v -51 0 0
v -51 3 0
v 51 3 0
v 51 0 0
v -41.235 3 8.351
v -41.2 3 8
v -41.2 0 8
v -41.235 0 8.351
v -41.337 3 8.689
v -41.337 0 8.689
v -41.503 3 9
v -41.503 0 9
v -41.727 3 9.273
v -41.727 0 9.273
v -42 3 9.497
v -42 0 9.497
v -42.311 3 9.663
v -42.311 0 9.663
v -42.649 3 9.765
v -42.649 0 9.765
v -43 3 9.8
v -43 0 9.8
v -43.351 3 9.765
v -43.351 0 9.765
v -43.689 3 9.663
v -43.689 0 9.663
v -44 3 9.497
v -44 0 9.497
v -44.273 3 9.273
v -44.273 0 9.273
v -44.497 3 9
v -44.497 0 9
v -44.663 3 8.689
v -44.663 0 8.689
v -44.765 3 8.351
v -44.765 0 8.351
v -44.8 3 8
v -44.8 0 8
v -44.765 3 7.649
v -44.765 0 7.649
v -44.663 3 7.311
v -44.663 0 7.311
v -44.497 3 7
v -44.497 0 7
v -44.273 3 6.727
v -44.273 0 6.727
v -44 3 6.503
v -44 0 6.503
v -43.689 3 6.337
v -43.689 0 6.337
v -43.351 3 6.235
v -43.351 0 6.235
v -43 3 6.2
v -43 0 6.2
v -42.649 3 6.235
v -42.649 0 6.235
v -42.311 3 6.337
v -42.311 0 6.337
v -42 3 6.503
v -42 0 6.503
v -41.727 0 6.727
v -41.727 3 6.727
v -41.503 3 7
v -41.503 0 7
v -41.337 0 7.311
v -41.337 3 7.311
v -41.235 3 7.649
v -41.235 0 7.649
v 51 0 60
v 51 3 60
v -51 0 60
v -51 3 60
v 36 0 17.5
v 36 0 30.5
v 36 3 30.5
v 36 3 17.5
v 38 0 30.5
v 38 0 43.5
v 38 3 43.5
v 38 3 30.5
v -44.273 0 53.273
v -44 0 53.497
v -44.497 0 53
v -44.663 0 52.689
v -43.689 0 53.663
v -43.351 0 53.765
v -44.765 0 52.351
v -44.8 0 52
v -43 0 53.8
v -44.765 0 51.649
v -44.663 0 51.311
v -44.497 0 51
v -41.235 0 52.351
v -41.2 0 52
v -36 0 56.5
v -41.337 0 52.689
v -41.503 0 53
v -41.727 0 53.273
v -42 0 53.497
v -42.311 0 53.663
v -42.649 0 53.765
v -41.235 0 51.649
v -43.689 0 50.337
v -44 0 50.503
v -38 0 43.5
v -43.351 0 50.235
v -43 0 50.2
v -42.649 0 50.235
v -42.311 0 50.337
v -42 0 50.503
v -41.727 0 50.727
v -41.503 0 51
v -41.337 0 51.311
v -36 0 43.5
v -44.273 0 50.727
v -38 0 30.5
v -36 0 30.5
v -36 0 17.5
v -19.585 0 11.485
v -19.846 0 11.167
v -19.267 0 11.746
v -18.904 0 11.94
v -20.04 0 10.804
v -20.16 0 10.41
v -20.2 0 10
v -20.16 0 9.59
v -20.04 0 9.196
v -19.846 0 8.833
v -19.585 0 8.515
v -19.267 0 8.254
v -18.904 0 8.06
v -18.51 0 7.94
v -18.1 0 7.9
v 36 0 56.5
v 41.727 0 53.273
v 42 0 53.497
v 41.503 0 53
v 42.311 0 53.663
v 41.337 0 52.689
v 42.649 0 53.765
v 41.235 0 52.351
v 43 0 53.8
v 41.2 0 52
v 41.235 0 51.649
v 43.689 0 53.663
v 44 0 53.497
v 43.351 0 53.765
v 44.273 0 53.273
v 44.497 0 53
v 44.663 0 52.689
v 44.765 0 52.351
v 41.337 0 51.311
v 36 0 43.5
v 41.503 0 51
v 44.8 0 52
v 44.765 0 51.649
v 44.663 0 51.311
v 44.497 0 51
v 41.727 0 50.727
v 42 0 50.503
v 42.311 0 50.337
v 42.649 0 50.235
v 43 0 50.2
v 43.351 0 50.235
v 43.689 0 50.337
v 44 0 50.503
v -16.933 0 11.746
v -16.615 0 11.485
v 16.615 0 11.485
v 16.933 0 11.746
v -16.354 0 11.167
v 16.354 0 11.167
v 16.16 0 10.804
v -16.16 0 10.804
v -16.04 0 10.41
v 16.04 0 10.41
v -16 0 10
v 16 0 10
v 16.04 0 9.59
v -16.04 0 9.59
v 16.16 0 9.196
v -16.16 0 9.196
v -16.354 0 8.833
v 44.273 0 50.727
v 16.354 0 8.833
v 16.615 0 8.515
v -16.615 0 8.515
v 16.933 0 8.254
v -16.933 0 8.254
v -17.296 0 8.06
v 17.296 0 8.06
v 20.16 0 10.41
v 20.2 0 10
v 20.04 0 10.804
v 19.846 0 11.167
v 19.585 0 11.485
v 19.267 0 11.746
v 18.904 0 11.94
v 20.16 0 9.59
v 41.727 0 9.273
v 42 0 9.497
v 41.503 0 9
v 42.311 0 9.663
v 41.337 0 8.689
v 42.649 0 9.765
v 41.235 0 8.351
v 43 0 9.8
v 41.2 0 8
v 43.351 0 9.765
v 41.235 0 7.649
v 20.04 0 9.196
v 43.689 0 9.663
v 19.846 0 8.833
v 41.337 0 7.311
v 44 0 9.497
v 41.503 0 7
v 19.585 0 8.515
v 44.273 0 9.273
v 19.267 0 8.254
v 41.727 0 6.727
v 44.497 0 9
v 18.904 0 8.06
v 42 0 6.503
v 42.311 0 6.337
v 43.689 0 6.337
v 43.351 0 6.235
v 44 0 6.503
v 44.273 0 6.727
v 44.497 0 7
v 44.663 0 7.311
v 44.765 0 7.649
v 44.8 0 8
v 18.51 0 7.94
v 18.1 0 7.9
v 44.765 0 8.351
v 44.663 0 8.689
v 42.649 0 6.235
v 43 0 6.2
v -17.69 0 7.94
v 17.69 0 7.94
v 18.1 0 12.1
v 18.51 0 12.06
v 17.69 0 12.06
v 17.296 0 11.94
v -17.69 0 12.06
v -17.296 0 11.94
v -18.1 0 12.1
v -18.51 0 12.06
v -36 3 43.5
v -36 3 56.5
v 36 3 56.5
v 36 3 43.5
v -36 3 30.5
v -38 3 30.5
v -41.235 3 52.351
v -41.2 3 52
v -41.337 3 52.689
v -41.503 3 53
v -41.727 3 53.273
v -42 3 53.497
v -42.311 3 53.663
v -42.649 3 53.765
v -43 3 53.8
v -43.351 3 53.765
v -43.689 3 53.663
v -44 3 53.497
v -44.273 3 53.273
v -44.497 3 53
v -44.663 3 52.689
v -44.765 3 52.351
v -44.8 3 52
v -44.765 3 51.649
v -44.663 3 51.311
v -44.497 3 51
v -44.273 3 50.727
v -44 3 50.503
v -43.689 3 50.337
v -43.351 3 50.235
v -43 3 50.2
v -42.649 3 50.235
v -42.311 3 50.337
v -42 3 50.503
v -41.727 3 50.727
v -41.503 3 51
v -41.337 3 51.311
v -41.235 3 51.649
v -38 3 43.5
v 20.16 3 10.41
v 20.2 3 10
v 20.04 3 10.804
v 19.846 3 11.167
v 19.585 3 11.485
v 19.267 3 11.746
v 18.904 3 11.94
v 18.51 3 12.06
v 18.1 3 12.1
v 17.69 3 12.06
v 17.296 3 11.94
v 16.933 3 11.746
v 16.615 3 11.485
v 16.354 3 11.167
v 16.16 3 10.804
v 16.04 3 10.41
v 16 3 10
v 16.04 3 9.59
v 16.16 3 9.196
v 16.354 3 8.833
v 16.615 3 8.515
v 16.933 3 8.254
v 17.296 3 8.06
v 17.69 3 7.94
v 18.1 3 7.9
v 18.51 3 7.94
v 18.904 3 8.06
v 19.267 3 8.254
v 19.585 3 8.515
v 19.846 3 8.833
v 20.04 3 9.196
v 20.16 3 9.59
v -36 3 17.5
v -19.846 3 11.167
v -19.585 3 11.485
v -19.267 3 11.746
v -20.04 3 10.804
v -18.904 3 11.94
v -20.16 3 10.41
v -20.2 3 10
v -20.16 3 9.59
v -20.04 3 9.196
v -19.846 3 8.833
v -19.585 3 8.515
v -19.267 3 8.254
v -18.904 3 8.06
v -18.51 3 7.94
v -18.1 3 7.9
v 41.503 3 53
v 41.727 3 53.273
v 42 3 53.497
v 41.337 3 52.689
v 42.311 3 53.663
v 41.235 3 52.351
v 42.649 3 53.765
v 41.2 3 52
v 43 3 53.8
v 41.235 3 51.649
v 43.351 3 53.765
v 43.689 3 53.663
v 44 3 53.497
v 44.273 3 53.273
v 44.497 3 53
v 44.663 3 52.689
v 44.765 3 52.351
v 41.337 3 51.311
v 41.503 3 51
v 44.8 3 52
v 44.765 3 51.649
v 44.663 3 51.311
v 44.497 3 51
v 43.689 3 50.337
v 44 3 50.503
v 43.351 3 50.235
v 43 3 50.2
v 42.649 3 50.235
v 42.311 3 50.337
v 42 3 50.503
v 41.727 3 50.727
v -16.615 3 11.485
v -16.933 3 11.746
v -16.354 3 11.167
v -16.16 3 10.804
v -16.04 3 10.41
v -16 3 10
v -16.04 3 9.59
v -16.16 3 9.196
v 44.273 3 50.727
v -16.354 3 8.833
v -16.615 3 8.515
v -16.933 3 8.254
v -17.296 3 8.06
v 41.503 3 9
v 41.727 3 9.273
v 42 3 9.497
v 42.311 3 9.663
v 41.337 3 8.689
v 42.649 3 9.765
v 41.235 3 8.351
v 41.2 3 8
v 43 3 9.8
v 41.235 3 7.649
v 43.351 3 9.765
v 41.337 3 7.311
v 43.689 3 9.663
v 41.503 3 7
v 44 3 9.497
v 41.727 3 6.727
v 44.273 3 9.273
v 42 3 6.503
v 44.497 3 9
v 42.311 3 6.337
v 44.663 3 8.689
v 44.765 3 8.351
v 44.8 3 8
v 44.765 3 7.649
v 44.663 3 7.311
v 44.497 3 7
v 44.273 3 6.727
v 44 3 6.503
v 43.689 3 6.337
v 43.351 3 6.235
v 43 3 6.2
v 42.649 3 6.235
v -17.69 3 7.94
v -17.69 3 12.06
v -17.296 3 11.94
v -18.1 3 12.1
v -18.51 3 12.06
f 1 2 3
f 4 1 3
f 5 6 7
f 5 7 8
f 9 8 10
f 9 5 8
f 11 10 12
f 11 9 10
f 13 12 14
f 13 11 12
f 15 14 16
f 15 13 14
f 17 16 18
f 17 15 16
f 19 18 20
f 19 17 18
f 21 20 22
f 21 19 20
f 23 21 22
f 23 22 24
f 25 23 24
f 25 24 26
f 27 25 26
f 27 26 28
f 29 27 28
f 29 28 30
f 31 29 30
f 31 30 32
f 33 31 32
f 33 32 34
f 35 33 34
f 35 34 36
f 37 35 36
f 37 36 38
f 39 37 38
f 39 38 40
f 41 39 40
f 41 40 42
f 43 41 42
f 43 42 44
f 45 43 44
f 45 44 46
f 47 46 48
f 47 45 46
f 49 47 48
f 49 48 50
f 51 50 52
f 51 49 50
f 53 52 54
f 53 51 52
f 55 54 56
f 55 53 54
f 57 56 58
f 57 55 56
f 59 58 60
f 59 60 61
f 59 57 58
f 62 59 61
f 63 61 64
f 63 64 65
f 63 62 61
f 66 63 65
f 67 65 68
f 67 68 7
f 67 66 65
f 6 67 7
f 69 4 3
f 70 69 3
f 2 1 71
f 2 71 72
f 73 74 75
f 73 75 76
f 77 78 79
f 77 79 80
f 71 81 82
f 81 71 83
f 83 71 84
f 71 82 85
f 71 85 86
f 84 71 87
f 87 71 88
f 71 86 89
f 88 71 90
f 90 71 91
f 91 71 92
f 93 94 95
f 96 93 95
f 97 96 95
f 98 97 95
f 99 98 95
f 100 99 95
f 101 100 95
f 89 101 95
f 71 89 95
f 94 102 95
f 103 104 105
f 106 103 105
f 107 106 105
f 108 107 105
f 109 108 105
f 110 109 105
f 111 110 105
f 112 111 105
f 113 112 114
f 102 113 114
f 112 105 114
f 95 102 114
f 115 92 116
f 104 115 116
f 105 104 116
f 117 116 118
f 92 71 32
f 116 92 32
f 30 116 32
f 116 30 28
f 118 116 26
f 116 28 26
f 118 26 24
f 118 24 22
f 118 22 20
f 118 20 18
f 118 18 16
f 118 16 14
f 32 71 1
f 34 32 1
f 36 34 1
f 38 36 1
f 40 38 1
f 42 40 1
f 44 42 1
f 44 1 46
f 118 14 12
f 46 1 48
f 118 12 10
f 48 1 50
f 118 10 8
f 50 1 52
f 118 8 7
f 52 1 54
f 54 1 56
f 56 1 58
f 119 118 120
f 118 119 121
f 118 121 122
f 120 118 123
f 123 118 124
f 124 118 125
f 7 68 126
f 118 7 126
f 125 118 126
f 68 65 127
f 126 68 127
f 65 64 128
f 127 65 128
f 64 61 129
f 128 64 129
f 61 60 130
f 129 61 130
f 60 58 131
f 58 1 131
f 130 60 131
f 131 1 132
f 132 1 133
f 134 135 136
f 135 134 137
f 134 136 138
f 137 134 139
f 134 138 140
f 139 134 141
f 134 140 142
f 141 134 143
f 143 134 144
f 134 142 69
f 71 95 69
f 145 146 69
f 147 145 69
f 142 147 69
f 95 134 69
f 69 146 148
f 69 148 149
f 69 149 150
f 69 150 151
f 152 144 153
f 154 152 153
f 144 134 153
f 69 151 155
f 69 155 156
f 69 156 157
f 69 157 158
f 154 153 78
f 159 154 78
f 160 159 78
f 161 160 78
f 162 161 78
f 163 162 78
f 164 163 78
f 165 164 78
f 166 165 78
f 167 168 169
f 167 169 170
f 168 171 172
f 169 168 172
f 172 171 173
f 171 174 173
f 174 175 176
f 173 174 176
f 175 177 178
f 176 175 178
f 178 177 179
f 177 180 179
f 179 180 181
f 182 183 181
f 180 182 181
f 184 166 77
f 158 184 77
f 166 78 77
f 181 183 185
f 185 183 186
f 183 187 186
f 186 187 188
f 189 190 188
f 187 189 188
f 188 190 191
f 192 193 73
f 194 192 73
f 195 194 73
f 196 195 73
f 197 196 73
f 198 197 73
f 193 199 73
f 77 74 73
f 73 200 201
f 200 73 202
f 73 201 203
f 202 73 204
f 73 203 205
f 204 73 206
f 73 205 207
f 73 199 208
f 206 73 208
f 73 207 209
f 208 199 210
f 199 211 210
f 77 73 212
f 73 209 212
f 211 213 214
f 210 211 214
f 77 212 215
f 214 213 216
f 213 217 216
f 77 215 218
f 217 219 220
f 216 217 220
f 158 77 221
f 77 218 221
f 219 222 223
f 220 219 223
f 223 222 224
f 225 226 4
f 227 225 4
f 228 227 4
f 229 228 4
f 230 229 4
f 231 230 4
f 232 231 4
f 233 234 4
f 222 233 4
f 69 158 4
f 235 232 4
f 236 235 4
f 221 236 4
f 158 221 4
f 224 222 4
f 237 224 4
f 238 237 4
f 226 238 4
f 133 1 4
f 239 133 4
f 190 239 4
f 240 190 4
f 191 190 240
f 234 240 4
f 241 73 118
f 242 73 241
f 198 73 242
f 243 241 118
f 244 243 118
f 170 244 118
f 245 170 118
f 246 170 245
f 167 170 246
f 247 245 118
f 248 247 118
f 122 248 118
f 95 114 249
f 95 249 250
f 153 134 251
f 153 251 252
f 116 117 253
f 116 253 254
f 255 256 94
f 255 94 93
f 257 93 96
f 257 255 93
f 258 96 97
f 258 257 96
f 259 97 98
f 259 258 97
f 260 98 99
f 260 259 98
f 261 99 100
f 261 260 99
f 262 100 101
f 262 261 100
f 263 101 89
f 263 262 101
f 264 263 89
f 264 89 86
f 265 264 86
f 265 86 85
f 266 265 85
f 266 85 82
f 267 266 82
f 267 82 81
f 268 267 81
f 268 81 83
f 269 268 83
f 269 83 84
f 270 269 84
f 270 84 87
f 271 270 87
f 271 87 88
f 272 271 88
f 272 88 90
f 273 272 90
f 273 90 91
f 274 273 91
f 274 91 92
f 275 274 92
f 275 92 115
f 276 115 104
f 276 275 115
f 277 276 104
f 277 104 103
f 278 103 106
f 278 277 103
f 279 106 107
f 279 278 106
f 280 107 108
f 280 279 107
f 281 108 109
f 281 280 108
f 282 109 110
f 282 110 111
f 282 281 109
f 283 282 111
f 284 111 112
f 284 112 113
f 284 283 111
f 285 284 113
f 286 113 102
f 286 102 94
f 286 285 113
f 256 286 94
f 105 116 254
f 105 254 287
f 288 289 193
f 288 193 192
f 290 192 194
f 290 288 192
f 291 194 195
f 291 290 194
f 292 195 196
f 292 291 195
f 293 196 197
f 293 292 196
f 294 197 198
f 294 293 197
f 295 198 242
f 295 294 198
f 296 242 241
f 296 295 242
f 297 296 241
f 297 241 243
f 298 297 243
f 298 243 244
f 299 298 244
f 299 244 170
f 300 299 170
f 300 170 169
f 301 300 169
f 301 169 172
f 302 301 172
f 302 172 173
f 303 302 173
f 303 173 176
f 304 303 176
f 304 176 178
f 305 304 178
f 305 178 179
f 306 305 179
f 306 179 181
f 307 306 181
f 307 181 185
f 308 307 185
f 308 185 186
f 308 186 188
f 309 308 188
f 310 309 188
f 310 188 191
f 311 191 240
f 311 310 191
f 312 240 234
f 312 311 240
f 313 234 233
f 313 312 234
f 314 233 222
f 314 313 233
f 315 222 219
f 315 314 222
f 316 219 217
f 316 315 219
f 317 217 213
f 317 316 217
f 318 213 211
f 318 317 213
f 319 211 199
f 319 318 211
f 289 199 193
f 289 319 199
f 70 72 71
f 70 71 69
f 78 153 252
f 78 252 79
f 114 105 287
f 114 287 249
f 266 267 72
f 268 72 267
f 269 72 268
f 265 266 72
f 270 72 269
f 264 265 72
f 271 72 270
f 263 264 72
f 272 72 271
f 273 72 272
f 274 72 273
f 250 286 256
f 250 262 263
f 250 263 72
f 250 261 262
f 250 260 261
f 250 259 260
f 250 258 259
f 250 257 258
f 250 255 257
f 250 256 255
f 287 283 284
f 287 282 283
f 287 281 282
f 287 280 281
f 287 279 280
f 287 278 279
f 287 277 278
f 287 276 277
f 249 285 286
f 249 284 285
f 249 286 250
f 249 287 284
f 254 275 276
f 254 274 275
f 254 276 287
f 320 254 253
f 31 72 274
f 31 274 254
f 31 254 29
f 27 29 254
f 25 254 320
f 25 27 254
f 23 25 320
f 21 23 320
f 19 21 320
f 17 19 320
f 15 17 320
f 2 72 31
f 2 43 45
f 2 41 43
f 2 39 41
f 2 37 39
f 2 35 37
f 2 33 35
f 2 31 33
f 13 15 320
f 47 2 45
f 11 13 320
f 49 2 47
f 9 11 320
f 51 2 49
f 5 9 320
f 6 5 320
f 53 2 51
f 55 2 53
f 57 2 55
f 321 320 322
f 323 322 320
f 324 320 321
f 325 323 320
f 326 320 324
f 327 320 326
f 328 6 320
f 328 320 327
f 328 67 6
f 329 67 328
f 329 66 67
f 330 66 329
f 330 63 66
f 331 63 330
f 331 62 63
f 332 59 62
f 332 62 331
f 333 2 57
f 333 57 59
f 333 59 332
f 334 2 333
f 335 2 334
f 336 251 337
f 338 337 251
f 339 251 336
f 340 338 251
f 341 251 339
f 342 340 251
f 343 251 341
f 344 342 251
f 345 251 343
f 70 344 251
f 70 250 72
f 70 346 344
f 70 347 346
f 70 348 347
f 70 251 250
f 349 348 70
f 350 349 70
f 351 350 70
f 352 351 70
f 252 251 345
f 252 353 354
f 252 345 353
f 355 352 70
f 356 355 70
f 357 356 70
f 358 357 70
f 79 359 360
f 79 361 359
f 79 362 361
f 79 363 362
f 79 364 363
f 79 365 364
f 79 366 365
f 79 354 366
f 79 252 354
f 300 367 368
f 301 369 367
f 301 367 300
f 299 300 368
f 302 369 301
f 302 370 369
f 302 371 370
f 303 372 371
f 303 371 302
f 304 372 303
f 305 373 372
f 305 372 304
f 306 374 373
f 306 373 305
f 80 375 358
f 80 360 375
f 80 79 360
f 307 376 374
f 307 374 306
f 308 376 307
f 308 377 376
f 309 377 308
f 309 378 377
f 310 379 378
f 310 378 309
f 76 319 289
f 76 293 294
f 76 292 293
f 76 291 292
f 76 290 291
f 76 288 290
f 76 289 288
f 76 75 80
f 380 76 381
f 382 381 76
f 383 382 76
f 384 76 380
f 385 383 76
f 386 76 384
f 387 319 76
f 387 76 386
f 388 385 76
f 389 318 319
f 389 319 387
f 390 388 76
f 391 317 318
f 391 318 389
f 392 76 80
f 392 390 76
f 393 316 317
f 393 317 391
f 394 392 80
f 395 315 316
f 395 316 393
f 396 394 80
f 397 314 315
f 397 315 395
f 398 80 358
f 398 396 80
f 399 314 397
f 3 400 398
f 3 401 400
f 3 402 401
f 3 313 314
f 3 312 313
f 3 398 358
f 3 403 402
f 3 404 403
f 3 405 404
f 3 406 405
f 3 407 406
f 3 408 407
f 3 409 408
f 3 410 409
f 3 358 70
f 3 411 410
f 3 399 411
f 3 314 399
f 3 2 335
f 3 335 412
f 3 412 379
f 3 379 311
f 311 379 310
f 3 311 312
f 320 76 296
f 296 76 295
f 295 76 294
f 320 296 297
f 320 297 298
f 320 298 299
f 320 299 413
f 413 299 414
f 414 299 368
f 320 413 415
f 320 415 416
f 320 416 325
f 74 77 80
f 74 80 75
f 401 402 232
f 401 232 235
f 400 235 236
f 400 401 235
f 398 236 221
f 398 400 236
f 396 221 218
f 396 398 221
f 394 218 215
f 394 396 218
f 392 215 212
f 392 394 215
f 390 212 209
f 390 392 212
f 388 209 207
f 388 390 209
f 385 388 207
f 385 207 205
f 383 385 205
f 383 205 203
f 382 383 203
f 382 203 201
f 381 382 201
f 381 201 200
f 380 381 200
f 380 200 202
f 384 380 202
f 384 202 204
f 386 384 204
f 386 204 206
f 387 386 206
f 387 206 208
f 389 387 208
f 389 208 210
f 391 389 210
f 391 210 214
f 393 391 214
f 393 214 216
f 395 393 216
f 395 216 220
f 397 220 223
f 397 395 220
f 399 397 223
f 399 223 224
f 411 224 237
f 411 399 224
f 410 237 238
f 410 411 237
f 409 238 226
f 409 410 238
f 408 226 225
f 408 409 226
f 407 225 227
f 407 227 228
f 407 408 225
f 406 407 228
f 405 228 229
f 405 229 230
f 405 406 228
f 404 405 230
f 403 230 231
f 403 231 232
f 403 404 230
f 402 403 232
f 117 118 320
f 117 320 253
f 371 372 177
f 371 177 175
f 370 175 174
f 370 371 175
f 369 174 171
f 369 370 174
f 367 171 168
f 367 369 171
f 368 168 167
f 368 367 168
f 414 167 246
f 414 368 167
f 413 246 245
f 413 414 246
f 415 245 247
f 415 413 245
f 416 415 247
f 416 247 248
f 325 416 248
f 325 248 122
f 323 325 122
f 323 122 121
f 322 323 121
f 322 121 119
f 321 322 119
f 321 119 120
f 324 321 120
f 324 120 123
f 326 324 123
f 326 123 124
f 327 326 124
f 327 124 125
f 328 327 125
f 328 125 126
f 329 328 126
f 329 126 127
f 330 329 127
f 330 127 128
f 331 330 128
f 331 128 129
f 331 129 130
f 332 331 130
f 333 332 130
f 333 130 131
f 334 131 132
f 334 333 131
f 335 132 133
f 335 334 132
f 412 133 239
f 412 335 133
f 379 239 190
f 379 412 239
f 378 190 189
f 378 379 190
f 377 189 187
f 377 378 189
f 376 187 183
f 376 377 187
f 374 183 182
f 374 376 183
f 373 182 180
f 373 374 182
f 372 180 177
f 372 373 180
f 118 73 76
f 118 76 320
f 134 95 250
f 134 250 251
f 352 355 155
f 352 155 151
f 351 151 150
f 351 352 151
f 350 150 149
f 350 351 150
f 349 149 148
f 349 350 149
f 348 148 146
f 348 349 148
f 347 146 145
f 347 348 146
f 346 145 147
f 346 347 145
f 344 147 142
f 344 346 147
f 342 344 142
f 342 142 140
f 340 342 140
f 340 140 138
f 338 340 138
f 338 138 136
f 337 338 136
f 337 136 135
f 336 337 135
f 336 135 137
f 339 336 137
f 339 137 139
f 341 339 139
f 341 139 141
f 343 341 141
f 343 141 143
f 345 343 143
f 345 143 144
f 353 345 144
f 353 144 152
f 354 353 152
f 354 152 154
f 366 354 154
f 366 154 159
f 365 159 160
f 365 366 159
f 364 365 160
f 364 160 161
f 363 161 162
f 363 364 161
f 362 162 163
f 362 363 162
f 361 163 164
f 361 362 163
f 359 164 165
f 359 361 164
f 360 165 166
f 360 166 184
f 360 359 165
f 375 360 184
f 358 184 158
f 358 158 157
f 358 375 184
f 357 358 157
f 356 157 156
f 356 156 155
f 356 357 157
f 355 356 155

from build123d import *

# Parameters (mm, degrees)
CYLINDER001_R     = 2.1
CYLINDER001_DEPTH = 10
CYLINDER_R        = 2.1
CYLINDER_DEPTH    = 10
EXTRUDE_DEPTH     = 10
CYLINDER002_R     = 1.8
CYLINDER002_DEPTH = 200
ARRAY_X_COUNT     = 2
ARRAY_X_PITCH     = 86
ARRAY_Z_COUNT     = 2
ARRAY_Z_PITCH     = 44
BOX001_W          = 102
BOX001_H          = 3
BOX001_DEPTH      = 60


with BuildPart() as hole_minus:
    # Cylinder001 → Cylinder001 (new body)
    with BuildSketch(Plane(origin=(18.1, 10, 10), x_dir=(1, 0, 0), z_dir=(0, -1, 0))):
        Circle(CYLINDER001_R)
    extrude(amount=CYLINDER001_DEPTH)


with BuildPart() as hole_plus:
    # Cylinder → Cylinder (new body)
    with BuildSketch(Plane(origin=(-18.1, 10, 10), x_dir=(1, 0, 0), z_dir=(0, -1, 0))):
        Circle(CYLINDER_R)
    extrude(amount=CYLINDER_DEPTH)


with BuildPart() as display_hole_extrude:
    # Sketch → Extrude (new body)
    with BuildSketch(Plane.XZ):
        Polygon((-36, 19.5), (36, 19.5), (36, 6.5), (38, 6.5), (38, -6.5), (36, -6.5), (36, -19.5), (-36, -19.5), (-36, -6.5), (-38, -6.5), (-38, 6.5), (-36, 6.5), align=None)
    extrude(amount=-EXTRUDE_DEPTH)


with BuildPart() as display_hole_extrude_1:
    # Extrude placement: moved
    add(display_hole_extrude.part.moved(Location((0, 0, 37))))


with BuildPart() as hole_fusion:
    # Cylinder002 → Cylinder002 (new body)
    with BuildSketch(Plane(origin=(-43, 200, 8), x_dir=(1, 0, 0), z_dir=(0, -1, 0))):
        Circle(CYLINDER002_R)
    extrude(amount=CYLINDER002_DEPTH)

    # Array X: hole fusion ×2


with BuildPart() as hole_fusion_1:
    add(hole_fusion.part)
    with Locations(*[(i * ARRAY_X_PITCH, 0, 0) for i in range(1, ARRAY_X_COUNT)]):
        add(hole_fusion.part)

    # Array Z: hole fusion ×2


with BuildPart() as hole_fusion_2:
    add(hole_fusion_1.part)
    with Locations(*[(0, 0, i * ARRAY_Z_PITCH) for i in range(1, ARRAY_Z_COUNT)]):
        add(hole_fusion_1.part)

    # Fusion: union hole_minus, hole_plus, display hole extrude
    add(hole_minus.part)
    add(hole_plus.part)
    add(display_hole_extrude_1.part)


with BuildPart() as front_panel_cut:
    # Box001 → Box001 (new body)
    with BuildSketch(Plane(origin=(-51, 0, 0), x_dir=(1, 0, 0), z_dir=(0, 0, 1))):
        with Locations((51, 1.5)):
            Rectangle(BOX001_W, BOX001_H)
    extrude(amount=BOX001_DEPTH)

    # Cut: cut hole fusion
    add(hole_fusion_2.part, mode=Mode.SUBTRACT)


solid = front_panel_cut.part
